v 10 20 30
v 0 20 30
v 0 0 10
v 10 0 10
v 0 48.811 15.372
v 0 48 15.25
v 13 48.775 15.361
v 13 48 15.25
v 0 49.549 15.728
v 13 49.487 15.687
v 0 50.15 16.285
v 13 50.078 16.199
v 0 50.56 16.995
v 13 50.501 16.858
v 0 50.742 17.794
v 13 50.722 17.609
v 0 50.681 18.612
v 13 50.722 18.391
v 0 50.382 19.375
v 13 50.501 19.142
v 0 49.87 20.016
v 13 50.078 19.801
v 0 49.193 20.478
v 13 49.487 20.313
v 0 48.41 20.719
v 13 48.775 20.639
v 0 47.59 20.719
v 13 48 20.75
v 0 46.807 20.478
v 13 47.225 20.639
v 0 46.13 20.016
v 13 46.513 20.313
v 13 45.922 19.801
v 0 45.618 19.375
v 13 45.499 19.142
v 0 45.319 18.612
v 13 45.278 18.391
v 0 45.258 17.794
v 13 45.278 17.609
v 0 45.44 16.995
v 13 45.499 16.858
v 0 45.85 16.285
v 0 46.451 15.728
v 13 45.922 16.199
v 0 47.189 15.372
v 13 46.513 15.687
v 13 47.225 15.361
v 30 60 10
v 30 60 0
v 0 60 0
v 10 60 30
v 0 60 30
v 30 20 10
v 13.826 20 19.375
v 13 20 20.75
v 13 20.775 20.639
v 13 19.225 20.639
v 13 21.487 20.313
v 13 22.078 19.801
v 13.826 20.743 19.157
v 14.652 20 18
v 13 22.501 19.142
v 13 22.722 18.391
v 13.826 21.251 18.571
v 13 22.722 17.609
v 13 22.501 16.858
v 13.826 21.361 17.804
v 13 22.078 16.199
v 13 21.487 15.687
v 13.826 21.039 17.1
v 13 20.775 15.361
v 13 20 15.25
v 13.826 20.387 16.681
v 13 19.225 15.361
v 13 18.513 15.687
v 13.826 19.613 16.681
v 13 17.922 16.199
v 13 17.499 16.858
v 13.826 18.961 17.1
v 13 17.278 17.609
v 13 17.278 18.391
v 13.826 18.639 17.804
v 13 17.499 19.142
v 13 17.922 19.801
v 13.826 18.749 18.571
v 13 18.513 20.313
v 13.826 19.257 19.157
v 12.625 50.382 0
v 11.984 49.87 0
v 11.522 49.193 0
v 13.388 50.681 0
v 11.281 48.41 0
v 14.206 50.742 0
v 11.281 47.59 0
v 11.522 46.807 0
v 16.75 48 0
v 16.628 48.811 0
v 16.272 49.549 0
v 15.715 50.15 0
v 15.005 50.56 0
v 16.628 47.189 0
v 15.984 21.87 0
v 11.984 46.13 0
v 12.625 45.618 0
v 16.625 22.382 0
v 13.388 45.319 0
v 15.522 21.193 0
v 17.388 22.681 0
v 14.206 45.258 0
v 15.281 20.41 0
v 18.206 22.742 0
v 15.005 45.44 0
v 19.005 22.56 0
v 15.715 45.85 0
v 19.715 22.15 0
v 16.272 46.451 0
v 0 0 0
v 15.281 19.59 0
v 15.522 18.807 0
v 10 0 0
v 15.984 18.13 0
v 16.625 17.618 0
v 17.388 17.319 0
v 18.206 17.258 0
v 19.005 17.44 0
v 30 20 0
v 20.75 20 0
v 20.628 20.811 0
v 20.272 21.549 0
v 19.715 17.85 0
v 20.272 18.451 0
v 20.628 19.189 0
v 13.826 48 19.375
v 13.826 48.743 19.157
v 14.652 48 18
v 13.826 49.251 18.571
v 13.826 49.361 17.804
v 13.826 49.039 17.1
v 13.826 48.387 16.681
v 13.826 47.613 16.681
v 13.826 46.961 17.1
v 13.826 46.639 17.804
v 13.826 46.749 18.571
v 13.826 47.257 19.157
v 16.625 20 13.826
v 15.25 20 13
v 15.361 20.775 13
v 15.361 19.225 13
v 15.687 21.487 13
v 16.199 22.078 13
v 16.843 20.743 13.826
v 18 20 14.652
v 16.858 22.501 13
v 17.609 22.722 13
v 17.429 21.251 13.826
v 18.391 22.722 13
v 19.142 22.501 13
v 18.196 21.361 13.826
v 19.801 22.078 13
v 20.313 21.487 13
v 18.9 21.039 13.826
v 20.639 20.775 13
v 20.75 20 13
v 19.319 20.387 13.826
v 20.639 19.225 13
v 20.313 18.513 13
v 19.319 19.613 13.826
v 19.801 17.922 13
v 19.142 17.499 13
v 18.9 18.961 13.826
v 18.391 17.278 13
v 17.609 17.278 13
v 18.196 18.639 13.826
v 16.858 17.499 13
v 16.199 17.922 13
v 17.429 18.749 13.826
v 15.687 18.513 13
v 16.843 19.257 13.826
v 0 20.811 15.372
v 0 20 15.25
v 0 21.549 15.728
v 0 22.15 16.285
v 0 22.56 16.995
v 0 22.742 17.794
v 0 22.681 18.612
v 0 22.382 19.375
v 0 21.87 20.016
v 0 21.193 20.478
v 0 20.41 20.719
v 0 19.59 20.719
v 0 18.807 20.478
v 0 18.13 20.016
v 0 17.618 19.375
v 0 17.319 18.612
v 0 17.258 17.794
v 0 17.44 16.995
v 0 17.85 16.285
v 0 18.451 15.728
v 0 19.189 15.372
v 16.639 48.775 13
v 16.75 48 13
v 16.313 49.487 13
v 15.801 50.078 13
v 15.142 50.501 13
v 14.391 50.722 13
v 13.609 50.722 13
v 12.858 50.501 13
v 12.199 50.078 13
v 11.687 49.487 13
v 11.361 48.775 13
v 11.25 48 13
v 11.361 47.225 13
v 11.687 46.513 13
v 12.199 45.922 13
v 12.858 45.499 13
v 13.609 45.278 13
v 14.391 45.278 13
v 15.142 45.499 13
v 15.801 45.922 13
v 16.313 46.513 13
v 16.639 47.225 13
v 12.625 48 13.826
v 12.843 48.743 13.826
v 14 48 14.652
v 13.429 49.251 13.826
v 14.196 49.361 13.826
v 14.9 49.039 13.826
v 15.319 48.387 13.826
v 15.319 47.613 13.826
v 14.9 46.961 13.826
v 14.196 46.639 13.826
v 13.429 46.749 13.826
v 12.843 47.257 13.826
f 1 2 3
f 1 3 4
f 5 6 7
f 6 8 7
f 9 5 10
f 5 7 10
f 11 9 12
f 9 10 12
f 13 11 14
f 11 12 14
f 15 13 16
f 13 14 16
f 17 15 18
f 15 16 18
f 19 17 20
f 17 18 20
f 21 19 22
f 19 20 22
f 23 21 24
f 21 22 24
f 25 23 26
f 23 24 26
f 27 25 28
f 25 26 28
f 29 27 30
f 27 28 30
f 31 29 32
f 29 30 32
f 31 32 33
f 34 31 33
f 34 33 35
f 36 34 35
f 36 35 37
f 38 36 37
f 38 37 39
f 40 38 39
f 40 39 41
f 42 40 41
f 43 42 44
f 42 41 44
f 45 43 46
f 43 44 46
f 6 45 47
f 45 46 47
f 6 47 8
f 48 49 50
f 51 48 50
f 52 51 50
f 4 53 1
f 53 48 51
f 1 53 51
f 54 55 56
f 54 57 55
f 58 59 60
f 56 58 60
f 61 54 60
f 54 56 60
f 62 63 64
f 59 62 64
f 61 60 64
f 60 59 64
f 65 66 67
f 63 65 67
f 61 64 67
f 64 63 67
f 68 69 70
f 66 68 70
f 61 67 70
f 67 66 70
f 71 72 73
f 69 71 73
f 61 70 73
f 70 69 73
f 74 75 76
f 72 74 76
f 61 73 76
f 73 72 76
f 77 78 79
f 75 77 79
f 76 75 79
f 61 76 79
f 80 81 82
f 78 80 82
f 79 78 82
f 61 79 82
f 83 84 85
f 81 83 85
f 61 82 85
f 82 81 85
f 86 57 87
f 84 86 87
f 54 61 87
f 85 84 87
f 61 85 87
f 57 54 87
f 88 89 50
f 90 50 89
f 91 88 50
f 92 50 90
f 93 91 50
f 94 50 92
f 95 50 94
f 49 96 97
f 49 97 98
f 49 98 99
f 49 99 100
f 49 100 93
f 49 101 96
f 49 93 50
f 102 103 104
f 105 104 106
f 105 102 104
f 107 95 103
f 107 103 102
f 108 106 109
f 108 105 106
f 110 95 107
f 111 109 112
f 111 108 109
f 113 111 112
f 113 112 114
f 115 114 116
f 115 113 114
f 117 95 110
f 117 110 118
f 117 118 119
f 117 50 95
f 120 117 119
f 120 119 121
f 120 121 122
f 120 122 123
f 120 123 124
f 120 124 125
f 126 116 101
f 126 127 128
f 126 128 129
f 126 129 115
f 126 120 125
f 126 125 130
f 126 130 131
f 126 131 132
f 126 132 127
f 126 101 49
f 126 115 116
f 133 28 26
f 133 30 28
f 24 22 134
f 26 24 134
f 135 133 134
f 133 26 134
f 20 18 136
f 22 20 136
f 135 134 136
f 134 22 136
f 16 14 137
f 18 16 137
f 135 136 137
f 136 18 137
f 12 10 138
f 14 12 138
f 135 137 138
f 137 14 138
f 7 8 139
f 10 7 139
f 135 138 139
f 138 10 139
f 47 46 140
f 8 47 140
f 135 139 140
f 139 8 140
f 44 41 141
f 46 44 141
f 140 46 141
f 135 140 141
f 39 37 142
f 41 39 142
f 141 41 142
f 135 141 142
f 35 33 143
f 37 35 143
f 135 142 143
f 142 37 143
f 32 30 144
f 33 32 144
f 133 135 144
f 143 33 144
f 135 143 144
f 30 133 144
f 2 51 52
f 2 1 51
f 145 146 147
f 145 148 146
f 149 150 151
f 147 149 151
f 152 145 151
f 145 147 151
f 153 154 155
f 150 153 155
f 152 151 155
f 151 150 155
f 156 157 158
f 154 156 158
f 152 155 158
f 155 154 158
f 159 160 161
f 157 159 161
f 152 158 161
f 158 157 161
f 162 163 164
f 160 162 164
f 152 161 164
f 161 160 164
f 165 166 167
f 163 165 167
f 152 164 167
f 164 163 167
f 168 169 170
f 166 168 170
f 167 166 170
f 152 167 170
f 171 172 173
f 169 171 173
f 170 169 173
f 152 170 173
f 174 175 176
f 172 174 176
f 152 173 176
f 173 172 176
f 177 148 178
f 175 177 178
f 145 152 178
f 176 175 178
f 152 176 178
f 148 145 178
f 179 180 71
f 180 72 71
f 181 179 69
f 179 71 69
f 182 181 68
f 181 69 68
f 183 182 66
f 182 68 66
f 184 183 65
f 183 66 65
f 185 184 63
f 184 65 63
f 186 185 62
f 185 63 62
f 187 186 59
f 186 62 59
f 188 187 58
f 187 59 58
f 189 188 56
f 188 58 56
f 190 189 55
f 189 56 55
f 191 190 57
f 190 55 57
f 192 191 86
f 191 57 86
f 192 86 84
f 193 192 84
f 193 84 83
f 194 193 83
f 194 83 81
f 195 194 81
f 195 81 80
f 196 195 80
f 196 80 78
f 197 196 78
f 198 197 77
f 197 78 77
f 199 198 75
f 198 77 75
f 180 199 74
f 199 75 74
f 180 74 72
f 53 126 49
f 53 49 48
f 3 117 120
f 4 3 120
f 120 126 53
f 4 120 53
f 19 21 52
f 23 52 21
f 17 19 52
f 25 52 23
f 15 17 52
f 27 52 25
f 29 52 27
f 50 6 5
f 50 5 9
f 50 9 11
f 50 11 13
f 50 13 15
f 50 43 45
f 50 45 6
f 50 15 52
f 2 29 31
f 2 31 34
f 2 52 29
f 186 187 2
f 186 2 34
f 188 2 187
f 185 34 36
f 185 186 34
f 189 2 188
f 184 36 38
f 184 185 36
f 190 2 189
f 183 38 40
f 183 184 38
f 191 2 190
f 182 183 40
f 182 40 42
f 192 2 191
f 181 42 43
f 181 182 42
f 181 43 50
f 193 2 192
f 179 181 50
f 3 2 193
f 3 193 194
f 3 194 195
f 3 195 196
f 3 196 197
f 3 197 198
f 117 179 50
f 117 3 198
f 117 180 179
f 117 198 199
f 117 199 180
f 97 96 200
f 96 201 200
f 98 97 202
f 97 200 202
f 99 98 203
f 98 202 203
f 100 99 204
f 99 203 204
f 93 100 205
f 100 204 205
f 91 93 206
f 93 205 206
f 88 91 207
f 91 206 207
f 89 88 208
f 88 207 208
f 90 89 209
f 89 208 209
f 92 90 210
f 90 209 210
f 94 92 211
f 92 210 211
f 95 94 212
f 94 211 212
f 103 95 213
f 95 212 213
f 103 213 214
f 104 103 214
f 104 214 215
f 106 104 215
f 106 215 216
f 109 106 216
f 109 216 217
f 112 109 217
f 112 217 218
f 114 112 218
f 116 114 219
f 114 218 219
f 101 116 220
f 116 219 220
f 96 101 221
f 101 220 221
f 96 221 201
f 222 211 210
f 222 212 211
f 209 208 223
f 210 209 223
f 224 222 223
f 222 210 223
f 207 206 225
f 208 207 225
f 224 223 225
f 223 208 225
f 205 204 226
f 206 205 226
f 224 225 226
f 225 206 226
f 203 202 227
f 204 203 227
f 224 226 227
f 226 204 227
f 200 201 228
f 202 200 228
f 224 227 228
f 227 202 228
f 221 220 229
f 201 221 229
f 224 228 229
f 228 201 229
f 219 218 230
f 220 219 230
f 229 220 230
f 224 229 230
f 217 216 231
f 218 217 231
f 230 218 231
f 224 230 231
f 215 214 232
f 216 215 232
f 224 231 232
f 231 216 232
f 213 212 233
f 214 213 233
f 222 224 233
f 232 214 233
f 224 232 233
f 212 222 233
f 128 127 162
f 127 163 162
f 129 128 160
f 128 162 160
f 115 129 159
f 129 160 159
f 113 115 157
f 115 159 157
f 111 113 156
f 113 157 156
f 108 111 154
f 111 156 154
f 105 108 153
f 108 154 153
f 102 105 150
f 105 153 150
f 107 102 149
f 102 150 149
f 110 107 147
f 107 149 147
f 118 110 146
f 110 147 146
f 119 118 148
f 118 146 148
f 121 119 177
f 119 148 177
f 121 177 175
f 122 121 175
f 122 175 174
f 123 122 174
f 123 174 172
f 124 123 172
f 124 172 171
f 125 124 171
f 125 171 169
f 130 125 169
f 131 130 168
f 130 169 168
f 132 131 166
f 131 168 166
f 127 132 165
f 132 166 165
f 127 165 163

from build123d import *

# Parameters (mm, degrees)
SCHIZZO1_W                   = 30
SCHIZZO1_H                   = 40
ESTRUSIONE_ESTRUSIONE1_DEPTH = 30
SMUSSO1_SIZE                 = 20
ESTRUSIONE_ESTRUSIONE2_DEPTH = 20
FORO_PER_VITE_M5_1_D         = 5.5
FORO_PER_VITE_M5_1_DEPTH     = 13
FORO_PER_VITE_M5_1_TIP       = 1.652366702
FORO_PER_VITE_M5_2_D         = 5.5
FORO_PER_VITE_M5_2_DEPTH     = 13
FORO_PER_VITE_M5_2_TIP       = 1.652366702


with BuildPart() as part:
    # Schizzo1 → Estrusione-Estrusione1 (new body)
    with BuildSketch(Plane.XY):
        with Locations((15, 20)):
            Rectangle(SCHIZZO1_W, SCHIZZO1_H)
    extrude(amount=ESTRUSIONE_ESTRUSIONE1_DEPTH)

    # Smusso1
    smusso1_edges = [part.edges().sort_by_distance(p)[0] for p in [
        (30, 20, 30),
        (30, 0, 15),
        (15, 0, 30),
    ]]
    chamfer(smusso1_edges, length=SMUSSO1_SIZE)

    # Schizzo2 → Estrusione-Estrusione2 (add)
    with BuildSketch(Plane(origin=(0, 40, 0), x_dir=(1, 0, 0), z_dir=(0, 1, 0))):
        Polygon((0, 0), (30, 0), (30, -10), (10, -30), (0, -30), align=None)
    extrude(amount=ESTRUSIONE_ESTRUSIONE2_DEPTH)

    # Foro per Vite M5-1
    with Locations(Plane.ZY):
        with Locations((18, 20), (18, 48)):
            Hole(FORO_PER_VITE_M5_1_D / 2, depth=FORO_PER_VITE_M5_1_DEPTH)
            with Locations((0, 0, -(FORO_PER_VITE_M5_1_DEPTH + FORO_PER_VITE_M5_1_TIP / 2))):  # 118° drill point
                Cone(0, FORO_PER_VITE_M5_1_D / 2, FORO_PER_VITE_M5_1_TIP, mode=Mode.SUBTRACT)

    # Foro per Vite M5-2
    with Locations(Plane(origin=(18, 20, 0), x_dir=(-1, 0, 0), z_dir=(0, 0, -1))):
        with Locations((0, 0), (4, 28)):
            Hole(FORO_PER_VITE_M5_2_D / 2, depth=FORO_PER_VITE_M5_2_DEPTH)
            with Locations((0, 0, -(FORO_PER_VITE_M5_2_DEPTH + FORO_PER_VITE_M5_2_TIP / 2))):  # 118° drill point
                Cone(0, FORO_PER_VITE_M5_2_D / 2, FORO_PER_VITE_M5_2_TIP, mode=Mode.SUBTRACT)


solid = part.part
